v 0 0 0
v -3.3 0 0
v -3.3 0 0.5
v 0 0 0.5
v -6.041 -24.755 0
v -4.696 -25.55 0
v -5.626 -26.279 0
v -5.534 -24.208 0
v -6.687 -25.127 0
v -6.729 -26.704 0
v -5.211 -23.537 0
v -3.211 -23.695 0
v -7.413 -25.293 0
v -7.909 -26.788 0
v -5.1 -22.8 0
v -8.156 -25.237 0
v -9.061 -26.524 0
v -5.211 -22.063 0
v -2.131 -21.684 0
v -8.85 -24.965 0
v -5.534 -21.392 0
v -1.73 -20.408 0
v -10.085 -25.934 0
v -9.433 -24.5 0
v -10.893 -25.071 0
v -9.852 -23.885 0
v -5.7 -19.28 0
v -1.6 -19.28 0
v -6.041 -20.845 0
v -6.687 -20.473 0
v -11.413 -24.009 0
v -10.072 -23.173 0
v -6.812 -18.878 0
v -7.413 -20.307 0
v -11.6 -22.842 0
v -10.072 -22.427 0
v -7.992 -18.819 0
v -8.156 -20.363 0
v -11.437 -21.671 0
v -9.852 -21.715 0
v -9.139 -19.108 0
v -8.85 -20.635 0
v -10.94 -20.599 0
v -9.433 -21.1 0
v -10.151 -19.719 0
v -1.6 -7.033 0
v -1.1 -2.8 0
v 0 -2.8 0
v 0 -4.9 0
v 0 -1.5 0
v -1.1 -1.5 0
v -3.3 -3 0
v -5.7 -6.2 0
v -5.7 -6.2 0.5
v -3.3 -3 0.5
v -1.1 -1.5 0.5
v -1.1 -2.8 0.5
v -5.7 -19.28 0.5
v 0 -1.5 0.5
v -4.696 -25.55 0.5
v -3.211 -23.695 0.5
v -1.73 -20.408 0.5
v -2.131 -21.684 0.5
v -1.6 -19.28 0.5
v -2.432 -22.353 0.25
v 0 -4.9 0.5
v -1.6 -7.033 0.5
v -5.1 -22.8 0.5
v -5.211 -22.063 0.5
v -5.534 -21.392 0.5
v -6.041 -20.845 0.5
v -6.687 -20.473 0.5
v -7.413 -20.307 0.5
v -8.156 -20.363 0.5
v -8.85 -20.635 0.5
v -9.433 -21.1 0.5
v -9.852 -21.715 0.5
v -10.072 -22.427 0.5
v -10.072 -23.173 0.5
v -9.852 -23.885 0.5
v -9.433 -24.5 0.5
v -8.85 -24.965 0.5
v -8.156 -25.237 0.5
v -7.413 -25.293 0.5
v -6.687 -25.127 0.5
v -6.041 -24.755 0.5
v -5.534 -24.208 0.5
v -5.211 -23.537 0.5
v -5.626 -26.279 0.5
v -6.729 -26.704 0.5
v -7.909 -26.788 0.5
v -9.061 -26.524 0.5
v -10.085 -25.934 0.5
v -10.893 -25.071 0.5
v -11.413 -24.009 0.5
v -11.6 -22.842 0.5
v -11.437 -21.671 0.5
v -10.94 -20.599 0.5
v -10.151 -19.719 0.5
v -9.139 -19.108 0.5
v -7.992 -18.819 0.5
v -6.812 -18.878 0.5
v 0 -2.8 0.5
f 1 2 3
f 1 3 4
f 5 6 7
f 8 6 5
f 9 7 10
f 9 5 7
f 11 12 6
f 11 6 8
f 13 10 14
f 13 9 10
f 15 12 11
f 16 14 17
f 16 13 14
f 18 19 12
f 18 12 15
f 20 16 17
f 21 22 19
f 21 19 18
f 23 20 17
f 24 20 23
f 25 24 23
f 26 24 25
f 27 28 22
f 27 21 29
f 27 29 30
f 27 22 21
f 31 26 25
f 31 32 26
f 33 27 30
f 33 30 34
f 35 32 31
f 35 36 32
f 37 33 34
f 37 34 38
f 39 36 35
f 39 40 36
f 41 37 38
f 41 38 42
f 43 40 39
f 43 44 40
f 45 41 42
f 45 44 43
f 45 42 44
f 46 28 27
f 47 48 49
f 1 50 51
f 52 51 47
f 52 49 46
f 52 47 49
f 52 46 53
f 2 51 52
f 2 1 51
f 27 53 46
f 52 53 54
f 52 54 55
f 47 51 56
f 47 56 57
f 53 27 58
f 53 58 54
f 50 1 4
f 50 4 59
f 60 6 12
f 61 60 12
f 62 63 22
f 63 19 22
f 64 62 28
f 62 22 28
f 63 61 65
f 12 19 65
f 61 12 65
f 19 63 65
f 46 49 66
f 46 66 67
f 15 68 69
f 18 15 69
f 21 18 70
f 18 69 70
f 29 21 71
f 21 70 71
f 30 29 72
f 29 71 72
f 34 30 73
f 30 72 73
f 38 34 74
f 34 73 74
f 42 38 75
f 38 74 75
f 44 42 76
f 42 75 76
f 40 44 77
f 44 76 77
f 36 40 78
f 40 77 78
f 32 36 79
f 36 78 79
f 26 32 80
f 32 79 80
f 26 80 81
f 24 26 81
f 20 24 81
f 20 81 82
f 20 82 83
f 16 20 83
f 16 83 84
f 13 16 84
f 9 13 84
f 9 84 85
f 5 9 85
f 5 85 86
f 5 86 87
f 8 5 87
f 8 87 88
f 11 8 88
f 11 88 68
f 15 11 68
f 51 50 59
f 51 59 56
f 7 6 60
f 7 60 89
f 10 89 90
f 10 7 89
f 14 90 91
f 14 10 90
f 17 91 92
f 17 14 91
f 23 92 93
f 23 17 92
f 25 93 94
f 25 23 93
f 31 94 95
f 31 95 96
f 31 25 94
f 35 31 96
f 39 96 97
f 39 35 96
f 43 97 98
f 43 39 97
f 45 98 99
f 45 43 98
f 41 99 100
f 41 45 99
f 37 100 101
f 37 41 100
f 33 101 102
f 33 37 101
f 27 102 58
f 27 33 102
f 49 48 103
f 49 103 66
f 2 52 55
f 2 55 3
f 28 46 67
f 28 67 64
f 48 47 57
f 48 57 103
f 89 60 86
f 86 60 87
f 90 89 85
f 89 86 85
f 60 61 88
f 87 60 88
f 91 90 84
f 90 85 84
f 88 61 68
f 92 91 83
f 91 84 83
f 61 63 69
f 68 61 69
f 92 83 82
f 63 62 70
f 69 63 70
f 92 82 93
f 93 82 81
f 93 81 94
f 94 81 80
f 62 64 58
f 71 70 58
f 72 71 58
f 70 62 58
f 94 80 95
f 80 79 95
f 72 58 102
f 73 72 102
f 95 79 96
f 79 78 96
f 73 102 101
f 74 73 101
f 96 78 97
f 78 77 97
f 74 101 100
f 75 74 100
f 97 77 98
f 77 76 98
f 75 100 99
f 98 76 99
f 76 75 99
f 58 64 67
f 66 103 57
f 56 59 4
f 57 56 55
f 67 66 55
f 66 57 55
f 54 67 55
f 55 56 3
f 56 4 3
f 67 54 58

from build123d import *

# Parameters (mm, degrees)
SALIENTE_EXTRUIR1_DEPTH = 0.5
CORTAR_EXTRUIR6_REACH   = 31.207
CROQUIS6_R              = 2.5


with BuildPart() as part:
    # Croquis1 → Saliente-Extruir1 (new body)
    with BuildSketch(Plane.XY):
        with BuildLine():
            Line((0, 0), (0, -1.5))
            Line((0, -1.5), (-1.1, -1.5))
            Line((-1.1, -1.5), (-1.1, -2.8))
            Line((-1.1, -2.8), (0, -2.8))
            Line((0, -2.8), (0, -4.9))
            Line((0, -4.9), (-1.6, -7.033333333))
            Line((-1.6, -7.033333333), (-1.6, -19.280056819))
            add(Edge.make_bspline(
                [(-4.695633314, -25.550391636), (-1.6, -22.281455624), (-1.6, -19.280056819)],
                knots=[4.71238898, 4.71238898, 4.71238898, 5.777895429, 5.777895429, 5.777895429], degree=2, weights=[1, 0.861411956, 1]))
            ThreePointArc((-4.695633314, -25.550391636), (-11.549653085, -23.432645639), (-5.7, -19.280056819))
            Line((-5.7, -19.280056819), (-5.7, -6.2))
            Line((-5.7, -6.2), (-3.3, -3))
            Line((-3.3, -3), (-3.3, 0))
            Line((-3.3, 0), (0, 0))
        make_face()
    extrude(amount=SALIENTE_EXTRUIR1_DEPTH)

    # Croquis6 → Cortar-Extruir6 (cut, up to next)
    with BuildSketch(Plane.XY.offset(0.5), mode=Mode.PRIVATE) as cortar_extruir6_sk1:
        with Locations((-7.6, -22.8)):
            Circle(CROQUIS6_R)
    cortar_extruir6_tool1 = extrude(cortar_extruir6_sk1.sketch, amount=-CORTAR_EXTRUIR6_REACH, mode=Mode.PRIVATE) & part.part
    add(cortar_extruir6_tool1.solids().sort_by_distance((-7.6, -22.8, 0.5))[0], mode=Mode.SUBTRACT)


solid = part.part
